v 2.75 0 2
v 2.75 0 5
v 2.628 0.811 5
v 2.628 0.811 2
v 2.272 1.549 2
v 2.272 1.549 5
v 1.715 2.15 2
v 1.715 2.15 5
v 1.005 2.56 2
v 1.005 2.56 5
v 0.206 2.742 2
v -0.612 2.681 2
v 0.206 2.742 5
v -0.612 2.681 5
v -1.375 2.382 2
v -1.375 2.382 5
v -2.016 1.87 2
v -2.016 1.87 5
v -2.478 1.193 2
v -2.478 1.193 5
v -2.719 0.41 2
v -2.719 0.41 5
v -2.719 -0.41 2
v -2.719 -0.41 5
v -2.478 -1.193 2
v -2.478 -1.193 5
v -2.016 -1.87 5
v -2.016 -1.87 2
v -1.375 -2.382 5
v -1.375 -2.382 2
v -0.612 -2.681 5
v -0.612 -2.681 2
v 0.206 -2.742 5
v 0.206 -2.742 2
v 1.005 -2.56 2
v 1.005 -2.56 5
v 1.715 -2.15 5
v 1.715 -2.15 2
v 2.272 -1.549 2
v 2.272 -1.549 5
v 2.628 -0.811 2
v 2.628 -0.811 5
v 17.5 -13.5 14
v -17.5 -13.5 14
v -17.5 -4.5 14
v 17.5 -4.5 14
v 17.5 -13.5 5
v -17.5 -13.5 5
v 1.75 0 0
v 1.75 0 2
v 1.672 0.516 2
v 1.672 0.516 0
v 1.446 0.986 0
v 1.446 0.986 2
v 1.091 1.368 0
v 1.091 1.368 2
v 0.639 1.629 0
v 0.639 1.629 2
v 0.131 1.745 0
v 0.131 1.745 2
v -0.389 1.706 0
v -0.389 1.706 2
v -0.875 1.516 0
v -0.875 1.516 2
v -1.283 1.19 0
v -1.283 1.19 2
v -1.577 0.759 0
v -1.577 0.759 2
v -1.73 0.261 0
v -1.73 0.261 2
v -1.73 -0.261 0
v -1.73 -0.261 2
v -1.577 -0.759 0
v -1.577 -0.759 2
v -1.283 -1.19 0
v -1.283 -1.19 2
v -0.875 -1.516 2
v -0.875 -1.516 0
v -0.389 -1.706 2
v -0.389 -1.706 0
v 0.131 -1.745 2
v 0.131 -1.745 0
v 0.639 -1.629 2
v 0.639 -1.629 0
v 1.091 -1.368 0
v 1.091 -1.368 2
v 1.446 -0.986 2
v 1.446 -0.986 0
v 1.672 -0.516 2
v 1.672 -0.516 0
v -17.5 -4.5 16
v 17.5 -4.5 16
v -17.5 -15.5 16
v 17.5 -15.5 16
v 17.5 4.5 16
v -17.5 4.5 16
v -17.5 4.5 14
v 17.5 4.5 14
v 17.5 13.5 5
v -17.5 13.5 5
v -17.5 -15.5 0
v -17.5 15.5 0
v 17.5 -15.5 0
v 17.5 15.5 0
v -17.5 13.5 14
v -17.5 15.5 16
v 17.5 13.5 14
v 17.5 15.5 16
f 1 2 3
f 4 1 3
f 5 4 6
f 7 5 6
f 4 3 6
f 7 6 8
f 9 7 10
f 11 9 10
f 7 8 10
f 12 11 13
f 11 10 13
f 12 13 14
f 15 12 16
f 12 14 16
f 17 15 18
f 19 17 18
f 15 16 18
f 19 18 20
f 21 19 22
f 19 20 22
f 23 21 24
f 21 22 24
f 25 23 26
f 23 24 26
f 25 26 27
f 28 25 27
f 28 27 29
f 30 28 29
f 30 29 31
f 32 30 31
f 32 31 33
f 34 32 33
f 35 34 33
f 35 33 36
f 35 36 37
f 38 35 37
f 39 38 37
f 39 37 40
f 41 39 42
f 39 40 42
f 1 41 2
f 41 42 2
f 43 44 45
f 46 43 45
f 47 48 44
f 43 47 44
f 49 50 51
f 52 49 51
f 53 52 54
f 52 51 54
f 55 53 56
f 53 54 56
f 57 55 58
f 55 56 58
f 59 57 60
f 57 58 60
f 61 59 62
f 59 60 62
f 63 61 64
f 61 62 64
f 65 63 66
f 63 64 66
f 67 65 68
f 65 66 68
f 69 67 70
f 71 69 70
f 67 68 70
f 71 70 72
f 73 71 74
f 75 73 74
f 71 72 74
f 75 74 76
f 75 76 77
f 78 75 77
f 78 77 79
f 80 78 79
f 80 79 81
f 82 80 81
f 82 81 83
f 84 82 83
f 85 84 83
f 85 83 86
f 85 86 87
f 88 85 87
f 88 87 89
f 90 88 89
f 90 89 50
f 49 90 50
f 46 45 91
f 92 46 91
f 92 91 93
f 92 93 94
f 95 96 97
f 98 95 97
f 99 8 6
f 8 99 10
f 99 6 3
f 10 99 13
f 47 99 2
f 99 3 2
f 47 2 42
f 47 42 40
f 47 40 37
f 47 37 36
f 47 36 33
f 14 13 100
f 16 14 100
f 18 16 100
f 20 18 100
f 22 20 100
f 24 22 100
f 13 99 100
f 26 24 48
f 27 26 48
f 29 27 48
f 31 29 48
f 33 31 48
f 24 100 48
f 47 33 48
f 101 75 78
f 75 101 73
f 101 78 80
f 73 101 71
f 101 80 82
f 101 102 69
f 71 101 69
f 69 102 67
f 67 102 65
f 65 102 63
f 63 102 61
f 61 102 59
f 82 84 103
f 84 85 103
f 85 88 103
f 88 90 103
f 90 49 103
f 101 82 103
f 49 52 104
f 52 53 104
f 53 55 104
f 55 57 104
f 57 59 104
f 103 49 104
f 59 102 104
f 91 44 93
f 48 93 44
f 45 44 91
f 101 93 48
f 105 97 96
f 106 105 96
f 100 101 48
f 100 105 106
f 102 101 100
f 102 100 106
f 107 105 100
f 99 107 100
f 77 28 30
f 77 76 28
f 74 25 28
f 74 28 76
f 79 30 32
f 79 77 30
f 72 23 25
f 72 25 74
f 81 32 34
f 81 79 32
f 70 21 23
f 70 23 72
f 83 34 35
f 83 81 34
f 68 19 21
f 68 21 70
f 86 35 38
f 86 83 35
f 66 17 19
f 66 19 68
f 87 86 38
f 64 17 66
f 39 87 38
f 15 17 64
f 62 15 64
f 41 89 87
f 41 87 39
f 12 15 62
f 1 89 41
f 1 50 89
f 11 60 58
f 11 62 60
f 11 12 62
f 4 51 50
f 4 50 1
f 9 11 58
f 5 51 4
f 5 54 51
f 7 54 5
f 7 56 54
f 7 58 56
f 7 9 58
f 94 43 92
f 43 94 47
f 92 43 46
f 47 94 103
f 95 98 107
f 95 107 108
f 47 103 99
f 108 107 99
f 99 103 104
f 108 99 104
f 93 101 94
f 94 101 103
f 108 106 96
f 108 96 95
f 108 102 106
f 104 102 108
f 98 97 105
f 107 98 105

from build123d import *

# Parameters (mm, degrees)
ESQUISSE1_W             = 35
ESQUISSE1_H             = 31
BOSS_EXTRU_1_DEPTH      = 16
ENL_V_MAT_EXTRU_1_DEPTH = 35
ESQUISSE3_R             = 1.75
ENL_V_MAT_EXTRU_2_DEPTH = 5
ESQUISSE4_R             = 2.75
ENL_V_MAT_EXTRU_3_DEPTH = 3


with BuildPart() as part:
    # Esquisse1 → Boss.-Extru.1 (new body)
    with BuildSketch(Plane.XY):
        Rectangle(ESQUISSE1_W, ESQUISSE1_H)
    extrude(amount=BOSS_EXTRU_1_DEPTH)

    # Esquisse2 → Enlèv. mat.-Extru.1 (cut)
    with BuildSketch(Plane.ZY.offset(17.5)):
        Polygon((5, 13.5), (5, -13.5), (14, -13.5), (14, -4.5), (16, -4.5), (16, 4.5), (14, 4.5), (14, 13.5), align=None)
    extrude(amount=-ENL_V_MAT_EXTRU_1_DEPTH, mode=Mode.SUBTRACT)

    # Esquisse3 → Enlèv. mat.-Extru.2 (cut)
    with BuildSketch(Plane.XY.offset(5)):
        Circle(ESQUISSE3_R)
    extrude(amount=-ENL_V_MAT_EXTRU_2_DEPTH, mode=Mode.SUBTRACT)

    # Esquisse4 → Enlèv. mat.-Extru.3 (cut)
    with BuildSketch(Plane.XY.offset(5)):
        Circle(ESQUISSE4_R)
    extrude(amount=-ENL_V_MAT_EXTRU_3_DEPTH, mode=Mode.SUBTRACT)


solid = part.part
